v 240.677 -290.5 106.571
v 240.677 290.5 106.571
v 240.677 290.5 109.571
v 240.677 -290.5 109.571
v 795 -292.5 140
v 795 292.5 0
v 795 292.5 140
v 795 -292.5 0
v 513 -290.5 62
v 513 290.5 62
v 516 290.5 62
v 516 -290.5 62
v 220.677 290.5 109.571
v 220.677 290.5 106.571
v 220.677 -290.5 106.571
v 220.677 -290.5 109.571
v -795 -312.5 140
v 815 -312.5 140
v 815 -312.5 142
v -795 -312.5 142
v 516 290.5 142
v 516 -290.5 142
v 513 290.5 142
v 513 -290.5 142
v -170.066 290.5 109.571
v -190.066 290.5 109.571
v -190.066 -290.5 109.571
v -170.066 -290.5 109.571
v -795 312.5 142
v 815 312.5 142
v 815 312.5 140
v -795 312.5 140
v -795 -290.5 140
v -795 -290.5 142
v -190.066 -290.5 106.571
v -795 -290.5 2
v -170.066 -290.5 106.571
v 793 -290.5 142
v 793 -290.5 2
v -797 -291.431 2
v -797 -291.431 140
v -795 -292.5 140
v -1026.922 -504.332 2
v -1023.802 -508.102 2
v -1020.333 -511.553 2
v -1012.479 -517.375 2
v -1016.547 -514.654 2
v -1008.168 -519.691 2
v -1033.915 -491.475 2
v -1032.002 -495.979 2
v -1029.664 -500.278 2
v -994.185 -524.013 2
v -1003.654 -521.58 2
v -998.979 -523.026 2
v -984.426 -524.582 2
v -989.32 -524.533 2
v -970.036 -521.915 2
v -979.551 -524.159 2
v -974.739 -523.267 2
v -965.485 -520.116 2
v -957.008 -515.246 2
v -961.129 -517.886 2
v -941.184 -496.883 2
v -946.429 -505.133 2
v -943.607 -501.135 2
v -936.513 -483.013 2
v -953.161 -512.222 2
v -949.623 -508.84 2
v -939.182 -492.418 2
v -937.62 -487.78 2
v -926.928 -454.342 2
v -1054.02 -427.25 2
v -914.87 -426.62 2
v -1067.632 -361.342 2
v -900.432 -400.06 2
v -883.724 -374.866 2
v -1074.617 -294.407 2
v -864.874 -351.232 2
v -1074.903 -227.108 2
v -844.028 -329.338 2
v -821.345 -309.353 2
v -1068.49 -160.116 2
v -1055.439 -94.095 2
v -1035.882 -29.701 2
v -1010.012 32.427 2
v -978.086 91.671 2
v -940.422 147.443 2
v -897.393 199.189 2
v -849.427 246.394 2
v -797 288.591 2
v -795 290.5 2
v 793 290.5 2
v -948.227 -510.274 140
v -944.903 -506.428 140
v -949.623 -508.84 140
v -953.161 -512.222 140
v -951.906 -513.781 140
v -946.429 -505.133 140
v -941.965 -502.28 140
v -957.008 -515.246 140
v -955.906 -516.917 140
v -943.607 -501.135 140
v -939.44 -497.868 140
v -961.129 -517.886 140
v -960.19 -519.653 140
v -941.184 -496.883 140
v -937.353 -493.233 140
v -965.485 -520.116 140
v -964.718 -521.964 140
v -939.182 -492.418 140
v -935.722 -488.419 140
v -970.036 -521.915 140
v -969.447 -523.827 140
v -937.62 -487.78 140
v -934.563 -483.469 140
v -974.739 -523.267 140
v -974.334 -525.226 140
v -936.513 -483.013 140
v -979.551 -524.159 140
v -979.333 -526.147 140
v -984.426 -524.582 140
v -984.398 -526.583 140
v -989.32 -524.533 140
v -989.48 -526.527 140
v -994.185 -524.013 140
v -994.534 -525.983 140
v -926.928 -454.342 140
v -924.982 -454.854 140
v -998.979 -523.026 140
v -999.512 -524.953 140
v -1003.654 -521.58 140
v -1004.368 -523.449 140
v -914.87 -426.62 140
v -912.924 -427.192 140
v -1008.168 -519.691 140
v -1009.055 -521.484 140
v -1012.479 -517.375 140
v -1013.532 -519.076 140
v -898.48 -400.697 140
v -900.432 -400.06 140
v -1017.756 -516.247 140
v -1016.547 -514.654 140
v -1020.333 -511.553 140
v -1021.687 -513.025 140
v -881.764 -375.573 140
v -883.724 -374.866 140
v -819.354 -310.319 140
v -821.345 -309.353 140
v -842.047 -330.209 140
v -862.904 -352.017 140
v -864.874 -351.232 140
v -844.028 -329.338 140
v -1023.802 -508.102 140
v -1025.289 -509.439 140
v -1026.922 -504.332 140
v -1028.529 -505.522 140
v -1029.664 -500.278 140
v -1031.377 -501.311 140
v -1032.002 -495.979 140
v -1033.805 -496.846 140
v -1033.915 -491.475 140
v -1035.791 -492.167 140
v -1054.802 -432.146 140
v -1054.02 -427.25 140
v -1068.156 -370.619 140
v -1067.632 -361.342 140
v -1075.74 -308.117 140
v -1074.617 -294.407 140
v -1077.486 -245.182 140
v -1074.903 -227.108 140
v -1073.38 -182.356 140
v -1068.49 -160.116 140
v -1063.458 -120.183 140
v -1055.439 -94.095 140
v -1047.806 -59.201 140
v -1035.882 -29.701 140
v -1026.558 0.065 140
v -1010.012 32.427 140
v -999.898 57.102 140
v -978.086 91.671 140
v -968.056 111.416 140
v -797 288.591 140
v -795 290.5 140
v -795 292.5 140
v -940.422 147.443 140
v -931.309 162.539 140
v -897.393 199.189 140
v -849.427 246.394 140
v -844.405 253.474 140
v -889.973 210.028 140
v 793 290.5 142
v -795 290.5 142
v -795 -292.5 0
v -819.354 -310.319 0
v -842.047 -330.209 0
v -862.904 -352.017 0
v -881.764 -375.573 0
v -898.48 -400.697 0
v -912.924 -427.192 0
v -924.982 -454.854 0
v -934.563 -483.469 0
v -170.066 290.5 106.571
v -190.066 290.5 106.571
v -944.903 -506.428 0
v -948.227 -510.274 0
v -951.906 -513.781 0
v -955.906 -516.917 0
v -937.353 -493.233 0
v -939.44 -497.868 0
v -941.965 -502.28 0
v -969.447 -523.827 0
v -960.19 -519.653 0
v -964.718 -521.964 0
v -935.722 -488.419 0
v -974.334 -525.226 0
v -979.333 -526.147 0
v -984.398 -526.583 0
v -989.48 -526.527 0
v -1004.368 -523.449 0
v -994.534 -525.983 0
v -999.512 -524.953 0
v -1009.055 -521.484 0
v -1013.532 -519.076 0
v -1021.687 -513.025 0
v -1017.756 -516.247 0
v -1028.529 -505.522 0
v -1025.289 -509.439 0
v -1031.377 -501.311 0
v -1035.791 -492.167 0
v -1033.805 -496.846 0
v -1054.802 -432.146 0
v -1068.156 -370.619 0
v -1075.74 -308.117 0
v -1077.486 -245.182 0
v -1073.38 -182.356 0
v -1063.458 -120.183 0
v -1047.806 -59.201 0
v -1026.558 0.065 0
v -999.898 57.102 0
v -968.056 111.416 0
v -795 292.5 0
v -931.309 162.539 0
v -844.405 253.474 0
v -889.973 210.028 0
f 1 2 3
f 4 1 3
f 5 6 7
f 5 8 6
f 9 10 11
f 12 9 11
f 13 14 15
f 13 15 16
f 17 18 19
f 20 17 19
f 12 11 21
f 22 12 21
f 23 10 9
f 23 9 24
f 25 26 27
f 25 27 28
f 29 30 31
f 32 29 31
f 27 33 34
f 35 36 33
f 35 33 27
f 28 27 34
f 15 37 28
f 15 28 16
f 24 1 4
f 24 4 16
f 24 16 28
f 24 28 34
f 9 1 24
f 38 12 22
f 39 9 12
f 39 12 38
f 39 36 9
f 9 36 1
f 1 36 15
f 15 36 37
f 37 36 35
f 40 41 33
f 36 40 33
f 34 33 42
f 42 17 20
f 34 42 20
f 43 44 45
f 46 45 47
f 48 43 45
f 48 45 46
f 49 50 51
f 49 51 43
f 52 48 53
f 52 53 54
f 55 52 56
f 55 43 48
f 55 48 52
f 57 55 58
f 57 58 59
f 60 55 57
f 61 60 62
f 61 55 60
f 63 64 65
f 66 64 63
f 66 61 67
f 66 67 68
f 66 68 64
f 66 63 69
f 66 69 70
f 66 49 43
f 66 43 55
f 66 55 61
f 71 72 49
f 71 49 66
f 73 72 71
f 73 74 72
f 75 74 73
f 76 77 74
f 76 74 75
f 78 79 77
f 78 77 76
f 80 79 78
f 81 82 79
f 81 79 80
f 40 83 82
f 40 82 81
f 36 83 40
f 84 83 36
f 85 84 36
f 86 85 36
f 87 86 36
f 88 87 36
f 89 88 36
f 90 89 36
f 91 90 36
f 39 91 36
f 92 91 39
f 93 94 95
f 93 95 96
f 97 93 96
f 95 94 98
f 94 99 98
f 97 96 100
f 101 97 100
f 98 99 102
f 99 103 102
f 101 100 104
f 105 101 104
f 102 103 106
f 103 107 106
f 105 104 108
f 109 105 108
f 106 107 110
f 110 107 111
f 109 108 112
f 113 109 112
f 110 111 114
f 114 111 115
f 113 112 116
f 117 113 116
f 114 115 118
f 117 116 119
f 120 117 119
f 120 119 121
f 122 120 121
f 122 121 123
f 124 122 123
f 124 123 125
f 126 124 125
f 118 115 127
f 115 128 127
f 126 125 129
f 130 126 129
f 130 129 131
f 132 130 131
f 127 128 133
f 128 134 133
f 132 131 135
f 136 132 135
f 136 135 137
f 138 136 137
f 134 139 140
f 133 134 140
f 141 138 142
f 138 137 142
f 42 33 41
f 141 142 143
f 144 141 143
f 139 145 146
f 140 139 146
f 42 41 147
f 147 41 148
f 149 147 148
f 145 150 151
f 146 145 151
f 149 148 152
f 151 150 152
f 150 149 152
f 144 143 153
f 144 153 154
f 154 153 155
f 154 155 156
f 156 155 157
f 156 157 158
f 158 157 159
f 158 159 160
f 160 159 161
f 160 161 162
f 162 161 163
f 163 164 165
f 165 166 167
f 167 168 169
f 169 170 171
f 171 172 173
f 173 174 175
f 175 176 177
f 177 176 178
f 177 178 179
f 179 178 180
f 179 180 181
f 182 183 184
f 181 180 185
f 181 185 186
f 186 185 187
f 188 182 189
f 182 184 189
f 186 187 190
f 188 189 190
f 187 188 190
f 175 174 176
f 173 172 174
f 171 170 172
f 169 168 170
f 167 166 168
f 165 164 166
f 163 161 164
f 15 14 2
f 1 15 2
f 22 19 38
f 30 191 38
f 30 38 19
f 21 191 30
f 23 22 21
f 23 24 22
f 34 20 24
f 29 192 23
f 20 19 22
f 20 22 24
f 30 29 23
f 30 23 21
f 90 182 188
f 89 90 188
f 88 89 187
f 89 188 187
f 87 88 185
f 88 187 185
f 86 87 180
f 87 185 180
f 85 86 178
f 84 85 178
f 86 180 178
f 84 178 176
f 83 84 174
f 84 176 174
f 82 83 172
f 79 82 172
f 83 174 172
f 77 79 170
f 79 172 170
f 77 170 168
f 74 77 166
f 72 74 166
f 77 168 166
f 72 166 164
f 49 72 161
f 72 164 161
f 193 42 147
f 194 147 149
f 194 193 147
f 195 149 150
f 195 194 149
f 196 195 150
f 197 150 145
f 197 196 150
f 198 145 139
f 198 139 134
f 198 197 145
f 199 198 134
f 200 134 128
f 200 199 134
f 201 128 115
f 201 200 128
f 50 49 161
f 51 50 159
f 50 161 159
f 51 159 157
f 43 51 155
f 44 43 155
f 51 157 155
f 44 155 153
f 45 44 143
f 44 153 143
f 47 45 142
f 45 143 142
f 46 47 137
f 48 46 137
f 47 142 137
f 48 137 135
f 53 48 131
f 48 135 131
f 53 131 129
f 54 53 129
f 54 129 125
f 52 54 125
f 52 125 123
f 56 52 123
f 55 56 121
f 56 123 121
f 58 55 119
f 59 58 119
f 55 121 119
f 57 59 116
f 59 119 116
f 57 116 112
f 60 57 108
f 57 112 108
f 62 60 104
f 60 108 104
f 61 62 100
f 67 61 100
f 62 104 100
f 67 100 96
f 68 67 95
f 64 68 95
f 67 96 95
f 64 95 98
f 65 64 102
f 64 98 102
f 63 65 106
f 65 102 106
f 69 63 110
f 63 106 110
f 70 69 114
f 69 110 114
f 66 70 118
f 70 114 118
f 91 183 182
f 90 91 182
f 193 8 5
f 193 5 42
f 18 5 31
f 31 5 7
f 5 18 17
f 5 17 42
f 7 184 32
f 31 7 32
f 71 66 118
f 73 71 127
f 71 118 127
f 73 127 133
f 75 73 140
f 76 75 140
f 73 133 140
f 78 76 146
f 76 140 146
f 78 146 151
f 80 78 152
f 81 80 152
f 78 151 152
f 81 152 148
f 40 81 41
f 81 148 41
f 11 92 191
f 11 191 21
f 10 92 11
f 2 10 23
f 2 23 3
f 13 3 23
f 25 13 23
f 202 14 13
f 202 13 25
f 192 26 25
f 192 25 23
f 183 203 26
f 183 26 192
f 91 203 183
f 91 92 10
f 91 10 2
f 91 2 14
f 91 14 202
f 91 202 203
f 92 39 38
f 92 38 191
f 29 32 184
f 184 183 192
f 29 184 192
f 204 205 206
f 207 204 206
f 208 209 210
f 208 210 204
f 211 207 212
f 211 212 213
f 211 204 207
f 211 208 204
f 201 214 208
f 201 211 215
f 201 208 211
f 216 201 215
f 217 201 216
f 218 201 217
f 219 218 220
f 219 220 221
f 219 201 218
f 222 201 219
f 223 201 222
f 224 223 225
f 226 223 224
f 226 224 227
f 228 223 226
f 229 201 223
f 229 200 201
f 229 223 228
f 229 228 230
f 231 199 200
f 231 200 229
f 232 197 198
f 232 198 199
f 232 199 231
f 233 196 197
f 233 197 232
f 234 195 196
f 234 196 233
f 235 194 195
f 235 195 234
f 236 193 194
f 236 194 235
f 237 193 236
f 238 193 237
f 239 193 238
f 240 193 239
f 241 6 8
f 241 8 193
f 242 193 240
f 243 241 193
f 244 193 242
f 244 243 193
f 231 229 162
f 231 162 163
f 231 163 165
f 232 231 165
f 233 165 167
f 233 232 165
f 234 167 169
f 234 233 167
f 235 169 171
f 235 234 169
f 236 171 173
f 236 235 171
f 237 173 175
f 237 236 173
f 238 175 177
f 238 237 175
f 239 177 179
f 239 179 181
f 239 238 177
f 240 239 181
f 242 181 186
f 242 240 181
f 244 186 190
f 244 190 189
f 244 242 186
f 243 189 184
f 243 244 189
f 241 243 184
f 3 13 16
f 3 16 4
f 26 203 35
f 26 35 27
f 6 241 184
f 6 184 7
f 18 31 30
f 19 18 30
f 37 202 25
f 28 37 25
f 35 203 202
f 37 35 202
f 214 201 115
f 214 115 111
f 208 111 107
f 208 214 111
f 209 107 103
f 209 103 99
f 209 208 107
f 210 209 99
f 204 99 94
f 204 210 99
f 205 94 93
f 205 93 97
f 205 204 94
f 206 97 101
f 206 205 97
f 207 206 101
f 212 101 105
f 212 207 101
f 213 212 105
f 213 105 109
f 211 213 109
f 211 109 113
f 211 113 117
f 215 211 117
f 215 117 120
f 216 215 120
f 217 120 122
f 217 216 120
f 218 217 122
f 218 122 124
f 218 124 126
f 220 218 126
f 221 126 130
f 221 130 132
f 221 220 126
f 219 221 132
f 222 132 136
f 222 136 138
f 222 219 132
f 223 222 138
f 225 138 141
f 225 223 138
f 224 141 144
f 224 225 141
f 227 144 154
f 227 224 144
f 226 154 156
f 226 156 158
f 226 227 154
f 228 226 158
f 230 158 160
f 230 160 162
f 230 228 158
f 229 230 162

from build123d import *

# Parameters (mm, degrees)
SKETCH_1_W          = 1590
SKETCH_1_H          = 585
EXTRUDE_1_DEPTH     = 2
EXTRUDE_2_DEPTH     = 140
SKETCH_3_W          = 1590
SKETCH_3_H          = 2
EXTRUDE_3_DEPTH     = 20
EXTRUDE_4_DEPTH     = 20
EXTRUDE_5_DEPTH     = 140
CUT_EXTRUDE_1_DEPTH = 138
SKETCH_8_W          = 20
SKETCH_8_H          = 3
EXTRUDE_6_DEPTH     = 581
SKETCH_9_W          = 3
SKETCH_9_H          = 80
EXTRUDE_7_DEPTH     = 581


with BuildPart() as part:
    # 草图1 → 凸台-拉伸1 (new body)
    with BuildSketch(Plane.XY):
        Rectangle(SKETCH_1_W, SKETCH_1_H)
    extrude(amount=EXTRUDE_1_DEPTH)

    # 草图2 → 凸台-拉伸2 (add)
    with BuildSketch(Plane.XY.offset(2)):
        Polygon((-795, -290.5), (793, -290.5), (793, 290.5), (-795, 290.5), (-795, 292.5), (795, 292.5), (795, -292.5), (-795, -292.5), align=None)
    extrude(amount=EXTRUDE_2_DEPTH)

    # 草图3 → 凸台-拉伸3 (add)
    with BuildSketch(Plane.XZ.offset(292.5)):
        with Locations((0, 141)):
            Rectangle(SKETCH_3_W, SKETCH_3_H)
    extrude_3 = extrude(amount=EXTRUDE_3_DEPTH)

    # 镜向1: 凸台-拉伸3 across plane
    add(extrude_3.mirror(Plane.ZX))

    # 草图4 → 凸台-拉伸4 (add)
    with BuildSketch(Plane(origin=(795, 0, 0), x_dir=(0, 0, -1), z_dir=(1, 0, 0))):
        Polygon((-140, 292.5), (-140, -292.5), (-140, -312.5), (-142, -312.5), (-142, 312.5), (-140, 312.5), align=None)
    extrude(amount=EXTRUDE_4_DEPTH)

    # 草图5 → 凸台-拉伸5 (add)
    with BuildSketch(Plane(origin=(0, 0, 0), x_dir=(-1, 0, 0), z_dir=(0, 0, -1))):
        with BuildLine():
            Line((795, 292.5), (795, -292.5))
            ThreePointArc((795, -292.5), (881.764191445, -375.573491887), (934.56290386, -483.469395139))
            ThreePointArc((934.56290386, -483.469395139), (981.860032363, -526.426096766), (1035.791420617, -492.166763143))
            ThreePointArc((1035.791420617, -492.166763143), (1047.805683522, -59.200609736), (795, 292.5))
        make_face()
    extrude(amount=-EXTRUDE_5_DEPTH)

    # 草图6 → 切除-拉伸1 (cut)
    with BuildSketch(Plane.XY.offset(140)):
        with BuildLine():
            Line((-797, -291.43118398), (-795, -290.5))
            Line((-795, -290.5), (-795, 290.5))
            Line((-795, 290.5), (-797, 288.591040402))
            ThreePointArc((-797, 288.591040402), (-1046.463523913, -61.653894645), (-1033.91490125, -491.474899668))
            ThreePointArc((-1033.91490125, -491.474899668), (-981.983290729, -524.429295604), (-936.512623715, -483.013081096))
            ThreePointArc((-936.512623715, -483.013081096), (-883.723814588, -374.866159142), (-797, -291.43118398))
        make_face()
    extrude(amount=-CUT_EXTRUDE_1_DEPTH, mode=Mode.SUBTRACT)

    # 草图8 → 凸台-拉伸6 (add)
    with BuildSketch(Plane.XZ.offset(-290.5)):
        with Locations((-180.065727279, 108.071414122)):
            Rectangle(SKETCH_8_W, SKETCH_8_H)
        with Locations((230.676945024, 108.071414122)):
            Rectangle(SKETCH_8_W, SKETCH_8_H)
    extrude(amount=EXTRUDE_6_DEPTH)

    # 草图9 → 凸台-拉伸7 (add)
    with BuildSketch(Plane.XZ.offset(-290.5)):
        with Locations((514.5, 102)):
            Rectangle(SKETCH_9_W, SKETCH_9_H)
    extrude(amount=EXTRUDE_7_DEPTH)


solid = part.part
